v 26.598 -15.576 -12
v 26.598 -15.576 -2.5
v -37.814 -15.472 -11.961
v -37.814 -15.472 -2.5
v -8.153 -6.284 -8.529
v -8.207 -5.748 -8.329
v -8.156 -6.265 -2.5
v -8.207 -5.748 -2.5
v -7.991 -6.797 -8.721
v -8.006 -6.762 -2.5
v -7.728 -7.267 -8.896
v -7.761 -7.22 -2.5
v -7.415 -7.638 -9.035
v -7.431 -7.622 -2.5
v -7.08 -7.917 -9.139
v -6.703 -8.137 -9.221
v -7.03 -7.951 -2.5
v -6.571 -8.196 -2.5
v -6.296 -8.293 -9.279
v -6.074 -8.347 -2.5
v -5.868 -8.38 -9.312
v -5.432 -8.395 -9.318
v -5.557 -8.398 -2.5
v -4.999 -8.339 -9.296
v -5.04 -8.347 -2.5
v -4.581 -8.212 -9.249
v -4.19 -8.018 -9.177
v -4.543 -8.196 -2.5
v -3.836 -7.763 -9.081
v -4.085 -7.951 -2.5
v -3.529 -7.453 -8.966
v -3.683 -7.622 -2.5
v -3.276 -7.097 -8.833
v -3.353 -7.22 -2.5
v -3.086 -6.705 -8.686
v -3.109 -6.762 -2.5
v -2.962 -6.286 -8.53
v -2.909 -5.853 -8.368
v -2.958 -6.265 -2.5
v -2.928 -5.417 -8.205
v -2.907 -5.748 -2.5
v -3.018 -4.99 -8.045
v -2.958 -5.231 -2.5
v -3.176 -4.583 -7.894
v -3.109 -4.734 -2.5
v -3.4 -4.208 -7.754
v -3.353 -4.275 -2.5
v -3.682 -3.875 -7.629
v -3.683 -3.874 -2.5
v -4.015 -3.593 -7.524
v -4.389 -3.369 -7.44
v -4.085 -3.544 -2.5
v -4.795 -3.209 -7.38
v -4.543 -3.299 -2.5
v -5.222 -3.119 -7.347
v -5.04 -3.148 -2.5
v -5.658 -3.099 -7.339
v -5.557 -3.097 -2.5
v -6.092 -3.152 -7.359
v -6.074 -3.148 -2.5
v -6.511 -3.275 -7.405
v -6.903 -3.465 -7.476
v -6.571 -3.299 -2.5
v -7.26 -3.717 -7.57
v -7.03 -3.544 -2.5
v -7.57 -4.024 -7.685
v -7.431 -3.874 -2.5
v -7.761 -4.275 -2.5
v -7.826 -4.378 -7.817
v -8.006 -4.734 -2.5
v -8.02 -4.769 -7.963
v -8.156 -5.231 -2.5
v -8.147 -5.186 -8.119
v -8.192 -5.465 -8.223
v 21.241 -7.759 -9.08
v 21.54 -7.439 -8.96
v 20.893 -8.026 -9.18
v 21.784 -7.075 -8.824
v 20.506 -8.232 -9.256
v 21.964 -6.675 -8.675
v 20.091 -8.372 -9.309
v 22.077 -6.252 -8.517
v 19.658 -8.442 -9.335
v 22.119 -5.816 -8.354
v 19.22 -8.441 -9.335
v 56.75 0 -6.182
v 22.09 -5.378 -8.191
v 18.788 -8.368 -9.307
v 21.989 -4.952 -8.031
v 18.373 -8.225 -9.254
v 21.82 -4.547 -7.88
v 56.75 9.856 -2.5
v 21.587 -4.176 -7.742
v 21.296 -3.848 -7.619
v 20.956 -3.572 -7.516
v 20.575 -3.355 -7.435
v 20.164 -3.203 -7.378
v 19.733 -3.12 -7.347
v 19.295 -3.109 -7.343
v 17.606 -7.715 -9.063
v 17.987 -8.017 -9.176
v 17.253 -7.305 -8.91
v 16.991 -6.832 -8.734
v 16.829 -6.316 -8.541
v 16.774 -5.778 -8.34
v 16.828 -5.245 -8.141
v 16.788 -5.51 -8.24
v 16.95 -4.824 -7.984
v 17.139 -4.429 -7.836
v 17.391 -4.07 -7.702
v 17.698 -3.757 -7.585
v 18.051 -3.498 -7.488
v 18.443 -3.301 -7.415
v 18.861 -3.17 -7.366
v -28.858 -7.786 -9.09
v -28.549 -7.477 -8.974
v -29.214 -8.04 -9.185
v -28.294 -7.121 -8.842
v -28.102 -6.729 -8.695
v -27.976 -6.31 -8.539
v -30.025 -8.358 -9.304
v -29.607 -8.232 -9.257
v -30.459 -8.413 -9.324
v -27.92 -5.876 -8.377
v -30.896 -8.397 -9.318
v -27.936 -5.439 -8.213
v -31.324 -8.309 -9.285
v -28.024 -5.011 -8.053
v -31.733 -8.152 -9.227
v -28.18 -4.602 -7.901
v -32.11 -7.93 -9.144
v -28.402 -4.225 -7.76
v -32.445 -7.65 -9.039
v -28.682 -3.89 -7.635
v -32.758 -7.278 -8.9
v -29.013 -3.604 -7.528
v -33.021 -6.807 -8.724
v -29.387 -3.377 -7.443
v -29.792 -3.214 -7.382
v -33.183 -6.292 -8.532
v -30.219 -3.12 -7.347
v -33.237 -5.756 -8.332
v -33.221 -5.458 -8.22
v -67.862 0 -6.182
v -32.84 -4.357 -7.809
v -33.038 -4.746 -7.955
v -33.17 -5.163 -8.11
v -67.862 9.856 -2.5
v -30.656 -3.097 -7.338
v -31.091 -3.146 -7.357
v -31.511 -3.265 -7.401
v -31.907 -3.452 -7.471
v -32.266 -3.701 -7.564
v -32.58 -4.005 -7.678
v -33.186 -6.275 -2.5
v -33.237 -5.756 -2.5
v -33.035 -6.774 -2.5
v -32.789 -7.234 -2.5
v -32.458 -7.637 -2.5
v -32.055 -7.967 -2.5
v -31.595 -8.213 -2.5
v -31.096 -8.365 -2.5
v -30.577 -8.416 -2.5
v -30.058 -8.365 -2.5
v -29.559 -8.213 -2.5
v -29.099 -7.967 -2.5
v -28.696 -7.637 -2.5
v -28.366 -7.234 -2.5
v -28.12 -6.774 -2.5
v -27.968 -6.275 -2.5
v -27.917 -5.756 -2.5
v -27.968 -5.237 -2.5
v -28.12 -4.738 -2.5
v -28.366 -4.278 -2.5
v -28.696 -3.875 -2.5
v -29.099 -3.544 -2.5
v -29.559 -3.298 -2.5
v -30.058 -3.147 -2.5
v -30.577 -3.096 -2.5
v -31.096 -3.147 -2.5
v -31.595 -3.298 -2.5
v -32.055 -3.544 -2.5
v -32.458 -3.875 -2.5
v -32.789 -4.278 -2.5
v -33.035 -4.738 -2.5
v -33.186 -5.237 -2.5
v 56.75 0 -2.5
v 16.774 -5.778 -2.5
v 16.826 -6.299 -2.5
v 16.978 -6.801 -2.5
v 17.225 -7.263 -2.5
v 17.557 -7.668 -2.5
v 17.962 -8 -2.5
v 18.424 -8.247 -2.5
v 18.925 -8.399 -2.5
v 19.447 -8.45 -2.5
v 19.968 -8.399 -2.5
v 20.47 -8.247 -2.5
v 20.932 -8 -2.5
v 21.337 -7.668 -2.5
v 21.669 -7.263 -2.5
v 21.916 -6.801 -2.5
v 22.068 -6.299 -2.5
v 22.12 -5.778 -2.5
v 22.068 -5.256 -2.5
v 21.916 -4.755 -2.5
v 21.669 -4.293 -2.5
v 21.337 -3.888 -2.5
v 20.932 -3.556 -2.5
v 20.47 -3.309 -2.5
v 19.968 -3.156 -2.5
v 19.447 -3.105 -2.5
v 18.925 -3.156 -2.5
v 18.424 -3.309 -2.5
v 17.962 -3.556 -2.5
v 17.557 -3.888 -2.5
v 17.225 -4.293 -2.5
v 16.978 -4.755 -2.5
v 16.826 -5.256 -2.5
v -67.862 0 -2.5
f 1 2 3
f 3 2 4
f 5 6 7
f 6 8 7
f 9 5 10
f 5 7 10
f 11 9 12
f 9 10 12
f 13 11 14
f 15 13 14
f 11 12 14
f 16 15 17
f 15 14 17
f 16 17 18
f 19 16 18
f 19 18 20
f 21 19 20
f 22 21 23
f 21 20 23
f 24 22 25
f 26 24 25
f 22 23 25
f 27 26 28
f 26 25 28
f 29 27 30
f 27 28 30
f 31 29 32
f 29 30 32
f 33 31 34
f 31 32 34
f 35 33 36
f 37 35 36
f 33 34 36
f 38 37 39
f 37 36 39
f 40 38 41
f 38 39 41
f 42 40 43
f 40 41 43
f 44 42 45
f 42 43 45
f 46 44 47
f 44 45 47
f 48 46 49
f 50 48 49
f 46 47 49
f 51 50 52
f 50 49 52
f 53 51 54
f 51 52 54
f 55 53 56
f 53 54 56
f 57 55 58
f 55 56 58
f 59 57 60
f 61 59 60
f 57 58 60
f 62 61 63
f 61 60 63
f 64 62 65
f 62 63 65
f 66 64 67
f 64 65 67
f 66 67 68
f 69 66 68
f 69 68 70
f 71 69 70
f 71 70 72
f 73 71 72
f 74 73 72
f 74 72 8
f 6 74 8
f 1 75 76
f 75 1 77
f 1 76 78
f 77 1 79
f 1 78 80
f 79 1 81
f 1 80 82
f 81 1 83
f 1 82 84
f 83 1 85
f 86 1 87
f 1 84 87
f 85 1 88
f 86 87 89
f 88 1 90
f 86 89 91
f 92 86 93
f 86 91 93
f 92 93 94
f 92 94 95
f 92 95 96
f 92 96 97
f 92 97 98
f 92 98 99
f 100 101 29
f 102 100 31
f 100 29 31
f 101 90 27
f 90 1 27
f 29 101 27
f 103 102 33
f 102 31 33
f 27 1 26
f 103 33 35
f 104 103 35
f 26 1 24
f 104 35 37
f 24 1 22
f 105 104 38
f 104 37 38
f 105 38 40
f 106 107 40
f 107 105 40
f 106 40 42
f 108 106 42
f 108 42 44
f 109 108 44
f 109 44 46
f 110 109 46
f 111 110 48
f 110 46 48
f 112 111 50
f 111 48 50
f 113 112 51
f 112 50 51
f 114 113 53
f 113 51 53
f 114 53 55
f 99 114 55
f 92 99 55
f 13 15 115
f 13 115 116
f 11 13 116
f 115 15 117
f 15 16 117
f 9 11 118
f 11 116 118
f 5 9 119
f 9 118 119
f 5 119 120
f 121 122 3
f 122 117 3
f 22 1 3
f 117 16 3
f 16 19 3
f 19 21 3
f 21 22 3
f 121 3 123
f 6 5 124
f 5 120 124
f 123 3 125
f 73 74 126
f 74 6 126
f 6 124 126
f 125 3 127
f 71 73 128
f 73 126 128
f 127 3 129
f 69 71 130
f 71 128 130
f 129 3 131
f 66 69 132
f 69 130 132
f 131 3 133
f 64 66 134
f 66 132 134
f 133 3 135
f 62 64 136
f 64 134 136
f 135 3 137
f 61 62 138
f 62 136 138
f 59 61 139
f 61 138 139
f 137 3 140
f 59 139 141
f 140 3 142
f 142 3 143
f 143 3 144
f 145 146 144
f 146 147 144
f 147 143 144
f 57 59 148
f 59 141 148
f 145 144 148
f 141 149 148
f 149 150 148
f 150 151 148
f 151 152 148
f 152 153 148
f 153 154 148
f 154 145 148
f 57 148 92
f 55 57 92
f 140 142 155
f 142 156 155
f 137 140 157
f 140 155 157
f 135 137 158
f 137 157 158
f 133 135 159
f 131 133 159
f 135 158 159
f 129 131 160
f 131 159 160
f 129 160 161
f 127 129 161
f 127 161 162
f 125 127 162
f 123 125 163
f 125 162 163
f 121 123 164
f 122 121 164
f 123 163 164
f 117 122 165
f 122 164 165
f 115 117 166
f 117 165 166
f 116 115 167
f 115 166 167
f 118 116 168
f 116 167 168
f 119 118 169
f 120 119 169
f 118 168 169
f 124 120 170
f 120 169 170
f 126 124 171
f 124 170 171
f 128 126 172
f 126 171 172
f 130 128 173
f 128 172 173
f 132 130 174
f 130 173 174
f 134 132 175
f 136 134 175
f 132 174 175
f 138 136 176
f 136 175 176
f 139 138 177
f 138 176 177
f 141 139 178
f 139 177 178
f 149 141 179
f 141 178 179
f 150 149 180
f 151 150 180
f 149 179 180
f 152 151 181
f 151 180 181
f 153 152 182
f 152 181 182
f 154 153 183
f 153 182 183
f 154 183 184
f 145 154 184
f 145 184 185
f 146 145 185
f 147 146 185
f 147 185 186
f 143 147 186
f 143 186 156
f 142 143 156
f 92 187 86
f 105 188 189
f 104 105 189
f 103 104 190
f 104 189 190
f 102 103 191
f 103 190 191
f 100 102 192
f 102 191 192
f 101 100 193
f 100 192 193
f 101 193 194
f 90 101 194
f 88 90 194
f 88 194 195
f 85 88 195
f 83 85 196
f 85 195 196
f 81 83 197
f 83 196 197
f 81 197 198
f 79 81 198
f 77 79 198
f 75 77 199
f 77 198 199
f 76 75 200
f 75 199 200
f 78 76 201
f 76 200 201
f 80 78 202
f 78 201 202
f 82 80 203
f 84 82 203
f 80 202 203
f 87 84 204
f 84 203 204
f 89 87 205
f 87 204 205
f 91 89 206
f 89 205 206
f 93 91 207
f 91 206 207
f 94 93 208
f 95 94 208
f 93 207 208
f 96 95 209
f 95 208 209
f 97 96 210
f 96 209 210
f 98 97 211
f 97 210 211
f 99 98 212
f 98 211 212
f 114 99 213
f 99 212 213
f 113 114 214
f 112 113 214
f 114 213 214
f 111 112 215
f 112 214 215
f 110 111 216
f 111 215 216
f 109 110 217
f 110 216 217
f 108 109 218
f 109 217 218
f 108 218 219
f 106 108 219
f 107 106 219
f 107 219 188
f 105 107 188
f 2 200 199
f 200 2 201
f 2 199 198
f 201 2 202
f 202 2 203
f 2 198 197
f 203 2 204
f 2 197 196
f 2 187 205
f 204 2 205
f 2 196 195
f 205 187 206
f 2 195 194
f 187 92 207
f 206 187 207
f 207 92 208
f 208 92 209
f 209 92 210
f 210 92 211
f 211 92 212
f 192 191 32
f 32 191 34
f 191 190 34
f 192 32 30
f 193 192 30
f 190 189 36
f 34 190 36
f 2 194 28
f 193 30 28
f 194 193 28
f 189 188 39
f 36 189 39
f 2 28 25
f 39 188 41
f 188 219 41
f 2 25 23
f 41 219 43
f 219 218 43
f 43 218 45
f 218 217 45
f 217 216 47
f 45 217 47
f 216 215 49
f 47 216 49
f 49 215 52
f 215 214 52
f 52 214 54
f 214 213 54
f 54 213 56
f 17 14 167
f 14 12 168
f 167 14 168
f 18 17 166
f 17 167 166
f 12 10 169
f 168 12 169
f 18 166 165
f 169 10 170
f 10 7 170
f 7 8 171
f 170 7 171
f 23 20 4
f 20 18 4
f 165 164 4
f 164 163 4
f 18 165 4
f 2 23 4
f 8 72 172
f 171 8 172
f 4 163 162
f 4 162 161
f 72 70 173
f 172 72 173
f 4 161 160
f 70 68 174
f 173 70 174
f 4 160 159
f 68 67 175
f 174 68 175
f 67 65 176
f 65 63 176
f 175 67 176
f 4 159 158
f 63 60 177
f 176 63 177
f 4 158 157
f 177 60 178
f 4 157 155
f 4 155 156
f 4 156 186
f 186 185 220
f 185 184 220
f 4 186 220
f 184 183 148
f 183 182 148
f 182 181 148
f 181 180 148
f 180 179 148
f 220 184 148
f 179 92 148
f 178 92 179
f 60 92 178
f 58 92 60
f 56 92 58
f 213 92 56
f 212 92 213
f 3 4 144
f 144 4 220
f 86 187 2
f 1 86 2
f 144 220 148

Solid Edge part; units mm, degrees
sketch "Sketch1" plane through (0, 0, 0) normal (0, 0, -1) x (-1, 0, 0)
  circle A0 centre (5.5571, -5.7478) radius 2.6503
  line L0 (-56.7501, 0) -> (-56.7501, 10)
  line L1 (-56.7501, 10) -> (67.8618, 10)
  line L2 (67.8618, 0) -> (67.8618, 10)
  line L3 (37.8136, -15.4719) -> (67.8618, 0)
  line L4 (-26.5984, -15.5762) -> (37.8136, -15.4719)
  line L5 (-56.7501, 0) -> (-26.5984, -15.5762)
  circle A1 centre (-19.4469, -5.7778) radius 2.6727
  circle A2 centre (30.5773, -5.7557) radius 2.66
  dimension "D1" = 5.3453
  dimension "D2" = 5.3006
  dimension "D3" = 5.32
  dimension "D4" = 33.9374
  dimension "D5" = 64.4121
  dimension "D6" = 33.7976
  dimension "D7" = 10
  dimension "D8" = 10
  dimension "D9" = 124.6119
extrude "Protrusion1" add sketch "Sketch1" along normal blind 12
sketch "Sketch2" plane through (56.7501, 5, -6) normal (1, 0, 0) x (0, 0, 1)
  line L0 (-6, -14.1297) -> (-20, 5)
  line L1 (-20, 5) -> (-6, 20.5762)
  line L2 (-6, 20.5762) -> (3.5539, -5)
  line L3 (3.5539, -5) -> (-6, -14.1297)
extrude "ExtrudedCutout_2" cut sketch "Sketch2" along normal mid plane 258
sketch "Sketch3" plane through (0, 0, 0) normal (0, 0, -1) x (-1, 0, 0)
  line L0 (37.8136, -15.4719) -> (67.8618, 0)
  line L1 (67.8618, 0) -> (67.8618, 10)
  line L2 (-56.7501, 10) -> (67.8618, 10)
  line L3 (-56.7501, 0) -> (-56.7501, 10)
  line L4 (-56.7501, 0) -> (-26.5984, -15.5762)
  line L5 (-26.5984, -15.5762) -> (37.8136, -15.4719)
  circle A0 centre (30.5773, -5.7557) radius 2.66
  circle A1 centre (5.5571, -5.7478) radius 2.6503
  circle A2 centre (-19.4469, -5.7778) radius 2.6727
  dimension "D1" = 5.3453
  dimension "D2" = 5.3006
  dimension "D3" = 5.32
  dimension "D4" = 33.9374
  dimension "D5" = 64.4121
  dimension "D6" = 33.7976
  dimension "D7" = 10
  dimension "D8" = 10
  dimension "D9" = 124.6119
extrude "ExtrudedCutout_3" cut sketch "Sketch3" along normal blind 2.5
